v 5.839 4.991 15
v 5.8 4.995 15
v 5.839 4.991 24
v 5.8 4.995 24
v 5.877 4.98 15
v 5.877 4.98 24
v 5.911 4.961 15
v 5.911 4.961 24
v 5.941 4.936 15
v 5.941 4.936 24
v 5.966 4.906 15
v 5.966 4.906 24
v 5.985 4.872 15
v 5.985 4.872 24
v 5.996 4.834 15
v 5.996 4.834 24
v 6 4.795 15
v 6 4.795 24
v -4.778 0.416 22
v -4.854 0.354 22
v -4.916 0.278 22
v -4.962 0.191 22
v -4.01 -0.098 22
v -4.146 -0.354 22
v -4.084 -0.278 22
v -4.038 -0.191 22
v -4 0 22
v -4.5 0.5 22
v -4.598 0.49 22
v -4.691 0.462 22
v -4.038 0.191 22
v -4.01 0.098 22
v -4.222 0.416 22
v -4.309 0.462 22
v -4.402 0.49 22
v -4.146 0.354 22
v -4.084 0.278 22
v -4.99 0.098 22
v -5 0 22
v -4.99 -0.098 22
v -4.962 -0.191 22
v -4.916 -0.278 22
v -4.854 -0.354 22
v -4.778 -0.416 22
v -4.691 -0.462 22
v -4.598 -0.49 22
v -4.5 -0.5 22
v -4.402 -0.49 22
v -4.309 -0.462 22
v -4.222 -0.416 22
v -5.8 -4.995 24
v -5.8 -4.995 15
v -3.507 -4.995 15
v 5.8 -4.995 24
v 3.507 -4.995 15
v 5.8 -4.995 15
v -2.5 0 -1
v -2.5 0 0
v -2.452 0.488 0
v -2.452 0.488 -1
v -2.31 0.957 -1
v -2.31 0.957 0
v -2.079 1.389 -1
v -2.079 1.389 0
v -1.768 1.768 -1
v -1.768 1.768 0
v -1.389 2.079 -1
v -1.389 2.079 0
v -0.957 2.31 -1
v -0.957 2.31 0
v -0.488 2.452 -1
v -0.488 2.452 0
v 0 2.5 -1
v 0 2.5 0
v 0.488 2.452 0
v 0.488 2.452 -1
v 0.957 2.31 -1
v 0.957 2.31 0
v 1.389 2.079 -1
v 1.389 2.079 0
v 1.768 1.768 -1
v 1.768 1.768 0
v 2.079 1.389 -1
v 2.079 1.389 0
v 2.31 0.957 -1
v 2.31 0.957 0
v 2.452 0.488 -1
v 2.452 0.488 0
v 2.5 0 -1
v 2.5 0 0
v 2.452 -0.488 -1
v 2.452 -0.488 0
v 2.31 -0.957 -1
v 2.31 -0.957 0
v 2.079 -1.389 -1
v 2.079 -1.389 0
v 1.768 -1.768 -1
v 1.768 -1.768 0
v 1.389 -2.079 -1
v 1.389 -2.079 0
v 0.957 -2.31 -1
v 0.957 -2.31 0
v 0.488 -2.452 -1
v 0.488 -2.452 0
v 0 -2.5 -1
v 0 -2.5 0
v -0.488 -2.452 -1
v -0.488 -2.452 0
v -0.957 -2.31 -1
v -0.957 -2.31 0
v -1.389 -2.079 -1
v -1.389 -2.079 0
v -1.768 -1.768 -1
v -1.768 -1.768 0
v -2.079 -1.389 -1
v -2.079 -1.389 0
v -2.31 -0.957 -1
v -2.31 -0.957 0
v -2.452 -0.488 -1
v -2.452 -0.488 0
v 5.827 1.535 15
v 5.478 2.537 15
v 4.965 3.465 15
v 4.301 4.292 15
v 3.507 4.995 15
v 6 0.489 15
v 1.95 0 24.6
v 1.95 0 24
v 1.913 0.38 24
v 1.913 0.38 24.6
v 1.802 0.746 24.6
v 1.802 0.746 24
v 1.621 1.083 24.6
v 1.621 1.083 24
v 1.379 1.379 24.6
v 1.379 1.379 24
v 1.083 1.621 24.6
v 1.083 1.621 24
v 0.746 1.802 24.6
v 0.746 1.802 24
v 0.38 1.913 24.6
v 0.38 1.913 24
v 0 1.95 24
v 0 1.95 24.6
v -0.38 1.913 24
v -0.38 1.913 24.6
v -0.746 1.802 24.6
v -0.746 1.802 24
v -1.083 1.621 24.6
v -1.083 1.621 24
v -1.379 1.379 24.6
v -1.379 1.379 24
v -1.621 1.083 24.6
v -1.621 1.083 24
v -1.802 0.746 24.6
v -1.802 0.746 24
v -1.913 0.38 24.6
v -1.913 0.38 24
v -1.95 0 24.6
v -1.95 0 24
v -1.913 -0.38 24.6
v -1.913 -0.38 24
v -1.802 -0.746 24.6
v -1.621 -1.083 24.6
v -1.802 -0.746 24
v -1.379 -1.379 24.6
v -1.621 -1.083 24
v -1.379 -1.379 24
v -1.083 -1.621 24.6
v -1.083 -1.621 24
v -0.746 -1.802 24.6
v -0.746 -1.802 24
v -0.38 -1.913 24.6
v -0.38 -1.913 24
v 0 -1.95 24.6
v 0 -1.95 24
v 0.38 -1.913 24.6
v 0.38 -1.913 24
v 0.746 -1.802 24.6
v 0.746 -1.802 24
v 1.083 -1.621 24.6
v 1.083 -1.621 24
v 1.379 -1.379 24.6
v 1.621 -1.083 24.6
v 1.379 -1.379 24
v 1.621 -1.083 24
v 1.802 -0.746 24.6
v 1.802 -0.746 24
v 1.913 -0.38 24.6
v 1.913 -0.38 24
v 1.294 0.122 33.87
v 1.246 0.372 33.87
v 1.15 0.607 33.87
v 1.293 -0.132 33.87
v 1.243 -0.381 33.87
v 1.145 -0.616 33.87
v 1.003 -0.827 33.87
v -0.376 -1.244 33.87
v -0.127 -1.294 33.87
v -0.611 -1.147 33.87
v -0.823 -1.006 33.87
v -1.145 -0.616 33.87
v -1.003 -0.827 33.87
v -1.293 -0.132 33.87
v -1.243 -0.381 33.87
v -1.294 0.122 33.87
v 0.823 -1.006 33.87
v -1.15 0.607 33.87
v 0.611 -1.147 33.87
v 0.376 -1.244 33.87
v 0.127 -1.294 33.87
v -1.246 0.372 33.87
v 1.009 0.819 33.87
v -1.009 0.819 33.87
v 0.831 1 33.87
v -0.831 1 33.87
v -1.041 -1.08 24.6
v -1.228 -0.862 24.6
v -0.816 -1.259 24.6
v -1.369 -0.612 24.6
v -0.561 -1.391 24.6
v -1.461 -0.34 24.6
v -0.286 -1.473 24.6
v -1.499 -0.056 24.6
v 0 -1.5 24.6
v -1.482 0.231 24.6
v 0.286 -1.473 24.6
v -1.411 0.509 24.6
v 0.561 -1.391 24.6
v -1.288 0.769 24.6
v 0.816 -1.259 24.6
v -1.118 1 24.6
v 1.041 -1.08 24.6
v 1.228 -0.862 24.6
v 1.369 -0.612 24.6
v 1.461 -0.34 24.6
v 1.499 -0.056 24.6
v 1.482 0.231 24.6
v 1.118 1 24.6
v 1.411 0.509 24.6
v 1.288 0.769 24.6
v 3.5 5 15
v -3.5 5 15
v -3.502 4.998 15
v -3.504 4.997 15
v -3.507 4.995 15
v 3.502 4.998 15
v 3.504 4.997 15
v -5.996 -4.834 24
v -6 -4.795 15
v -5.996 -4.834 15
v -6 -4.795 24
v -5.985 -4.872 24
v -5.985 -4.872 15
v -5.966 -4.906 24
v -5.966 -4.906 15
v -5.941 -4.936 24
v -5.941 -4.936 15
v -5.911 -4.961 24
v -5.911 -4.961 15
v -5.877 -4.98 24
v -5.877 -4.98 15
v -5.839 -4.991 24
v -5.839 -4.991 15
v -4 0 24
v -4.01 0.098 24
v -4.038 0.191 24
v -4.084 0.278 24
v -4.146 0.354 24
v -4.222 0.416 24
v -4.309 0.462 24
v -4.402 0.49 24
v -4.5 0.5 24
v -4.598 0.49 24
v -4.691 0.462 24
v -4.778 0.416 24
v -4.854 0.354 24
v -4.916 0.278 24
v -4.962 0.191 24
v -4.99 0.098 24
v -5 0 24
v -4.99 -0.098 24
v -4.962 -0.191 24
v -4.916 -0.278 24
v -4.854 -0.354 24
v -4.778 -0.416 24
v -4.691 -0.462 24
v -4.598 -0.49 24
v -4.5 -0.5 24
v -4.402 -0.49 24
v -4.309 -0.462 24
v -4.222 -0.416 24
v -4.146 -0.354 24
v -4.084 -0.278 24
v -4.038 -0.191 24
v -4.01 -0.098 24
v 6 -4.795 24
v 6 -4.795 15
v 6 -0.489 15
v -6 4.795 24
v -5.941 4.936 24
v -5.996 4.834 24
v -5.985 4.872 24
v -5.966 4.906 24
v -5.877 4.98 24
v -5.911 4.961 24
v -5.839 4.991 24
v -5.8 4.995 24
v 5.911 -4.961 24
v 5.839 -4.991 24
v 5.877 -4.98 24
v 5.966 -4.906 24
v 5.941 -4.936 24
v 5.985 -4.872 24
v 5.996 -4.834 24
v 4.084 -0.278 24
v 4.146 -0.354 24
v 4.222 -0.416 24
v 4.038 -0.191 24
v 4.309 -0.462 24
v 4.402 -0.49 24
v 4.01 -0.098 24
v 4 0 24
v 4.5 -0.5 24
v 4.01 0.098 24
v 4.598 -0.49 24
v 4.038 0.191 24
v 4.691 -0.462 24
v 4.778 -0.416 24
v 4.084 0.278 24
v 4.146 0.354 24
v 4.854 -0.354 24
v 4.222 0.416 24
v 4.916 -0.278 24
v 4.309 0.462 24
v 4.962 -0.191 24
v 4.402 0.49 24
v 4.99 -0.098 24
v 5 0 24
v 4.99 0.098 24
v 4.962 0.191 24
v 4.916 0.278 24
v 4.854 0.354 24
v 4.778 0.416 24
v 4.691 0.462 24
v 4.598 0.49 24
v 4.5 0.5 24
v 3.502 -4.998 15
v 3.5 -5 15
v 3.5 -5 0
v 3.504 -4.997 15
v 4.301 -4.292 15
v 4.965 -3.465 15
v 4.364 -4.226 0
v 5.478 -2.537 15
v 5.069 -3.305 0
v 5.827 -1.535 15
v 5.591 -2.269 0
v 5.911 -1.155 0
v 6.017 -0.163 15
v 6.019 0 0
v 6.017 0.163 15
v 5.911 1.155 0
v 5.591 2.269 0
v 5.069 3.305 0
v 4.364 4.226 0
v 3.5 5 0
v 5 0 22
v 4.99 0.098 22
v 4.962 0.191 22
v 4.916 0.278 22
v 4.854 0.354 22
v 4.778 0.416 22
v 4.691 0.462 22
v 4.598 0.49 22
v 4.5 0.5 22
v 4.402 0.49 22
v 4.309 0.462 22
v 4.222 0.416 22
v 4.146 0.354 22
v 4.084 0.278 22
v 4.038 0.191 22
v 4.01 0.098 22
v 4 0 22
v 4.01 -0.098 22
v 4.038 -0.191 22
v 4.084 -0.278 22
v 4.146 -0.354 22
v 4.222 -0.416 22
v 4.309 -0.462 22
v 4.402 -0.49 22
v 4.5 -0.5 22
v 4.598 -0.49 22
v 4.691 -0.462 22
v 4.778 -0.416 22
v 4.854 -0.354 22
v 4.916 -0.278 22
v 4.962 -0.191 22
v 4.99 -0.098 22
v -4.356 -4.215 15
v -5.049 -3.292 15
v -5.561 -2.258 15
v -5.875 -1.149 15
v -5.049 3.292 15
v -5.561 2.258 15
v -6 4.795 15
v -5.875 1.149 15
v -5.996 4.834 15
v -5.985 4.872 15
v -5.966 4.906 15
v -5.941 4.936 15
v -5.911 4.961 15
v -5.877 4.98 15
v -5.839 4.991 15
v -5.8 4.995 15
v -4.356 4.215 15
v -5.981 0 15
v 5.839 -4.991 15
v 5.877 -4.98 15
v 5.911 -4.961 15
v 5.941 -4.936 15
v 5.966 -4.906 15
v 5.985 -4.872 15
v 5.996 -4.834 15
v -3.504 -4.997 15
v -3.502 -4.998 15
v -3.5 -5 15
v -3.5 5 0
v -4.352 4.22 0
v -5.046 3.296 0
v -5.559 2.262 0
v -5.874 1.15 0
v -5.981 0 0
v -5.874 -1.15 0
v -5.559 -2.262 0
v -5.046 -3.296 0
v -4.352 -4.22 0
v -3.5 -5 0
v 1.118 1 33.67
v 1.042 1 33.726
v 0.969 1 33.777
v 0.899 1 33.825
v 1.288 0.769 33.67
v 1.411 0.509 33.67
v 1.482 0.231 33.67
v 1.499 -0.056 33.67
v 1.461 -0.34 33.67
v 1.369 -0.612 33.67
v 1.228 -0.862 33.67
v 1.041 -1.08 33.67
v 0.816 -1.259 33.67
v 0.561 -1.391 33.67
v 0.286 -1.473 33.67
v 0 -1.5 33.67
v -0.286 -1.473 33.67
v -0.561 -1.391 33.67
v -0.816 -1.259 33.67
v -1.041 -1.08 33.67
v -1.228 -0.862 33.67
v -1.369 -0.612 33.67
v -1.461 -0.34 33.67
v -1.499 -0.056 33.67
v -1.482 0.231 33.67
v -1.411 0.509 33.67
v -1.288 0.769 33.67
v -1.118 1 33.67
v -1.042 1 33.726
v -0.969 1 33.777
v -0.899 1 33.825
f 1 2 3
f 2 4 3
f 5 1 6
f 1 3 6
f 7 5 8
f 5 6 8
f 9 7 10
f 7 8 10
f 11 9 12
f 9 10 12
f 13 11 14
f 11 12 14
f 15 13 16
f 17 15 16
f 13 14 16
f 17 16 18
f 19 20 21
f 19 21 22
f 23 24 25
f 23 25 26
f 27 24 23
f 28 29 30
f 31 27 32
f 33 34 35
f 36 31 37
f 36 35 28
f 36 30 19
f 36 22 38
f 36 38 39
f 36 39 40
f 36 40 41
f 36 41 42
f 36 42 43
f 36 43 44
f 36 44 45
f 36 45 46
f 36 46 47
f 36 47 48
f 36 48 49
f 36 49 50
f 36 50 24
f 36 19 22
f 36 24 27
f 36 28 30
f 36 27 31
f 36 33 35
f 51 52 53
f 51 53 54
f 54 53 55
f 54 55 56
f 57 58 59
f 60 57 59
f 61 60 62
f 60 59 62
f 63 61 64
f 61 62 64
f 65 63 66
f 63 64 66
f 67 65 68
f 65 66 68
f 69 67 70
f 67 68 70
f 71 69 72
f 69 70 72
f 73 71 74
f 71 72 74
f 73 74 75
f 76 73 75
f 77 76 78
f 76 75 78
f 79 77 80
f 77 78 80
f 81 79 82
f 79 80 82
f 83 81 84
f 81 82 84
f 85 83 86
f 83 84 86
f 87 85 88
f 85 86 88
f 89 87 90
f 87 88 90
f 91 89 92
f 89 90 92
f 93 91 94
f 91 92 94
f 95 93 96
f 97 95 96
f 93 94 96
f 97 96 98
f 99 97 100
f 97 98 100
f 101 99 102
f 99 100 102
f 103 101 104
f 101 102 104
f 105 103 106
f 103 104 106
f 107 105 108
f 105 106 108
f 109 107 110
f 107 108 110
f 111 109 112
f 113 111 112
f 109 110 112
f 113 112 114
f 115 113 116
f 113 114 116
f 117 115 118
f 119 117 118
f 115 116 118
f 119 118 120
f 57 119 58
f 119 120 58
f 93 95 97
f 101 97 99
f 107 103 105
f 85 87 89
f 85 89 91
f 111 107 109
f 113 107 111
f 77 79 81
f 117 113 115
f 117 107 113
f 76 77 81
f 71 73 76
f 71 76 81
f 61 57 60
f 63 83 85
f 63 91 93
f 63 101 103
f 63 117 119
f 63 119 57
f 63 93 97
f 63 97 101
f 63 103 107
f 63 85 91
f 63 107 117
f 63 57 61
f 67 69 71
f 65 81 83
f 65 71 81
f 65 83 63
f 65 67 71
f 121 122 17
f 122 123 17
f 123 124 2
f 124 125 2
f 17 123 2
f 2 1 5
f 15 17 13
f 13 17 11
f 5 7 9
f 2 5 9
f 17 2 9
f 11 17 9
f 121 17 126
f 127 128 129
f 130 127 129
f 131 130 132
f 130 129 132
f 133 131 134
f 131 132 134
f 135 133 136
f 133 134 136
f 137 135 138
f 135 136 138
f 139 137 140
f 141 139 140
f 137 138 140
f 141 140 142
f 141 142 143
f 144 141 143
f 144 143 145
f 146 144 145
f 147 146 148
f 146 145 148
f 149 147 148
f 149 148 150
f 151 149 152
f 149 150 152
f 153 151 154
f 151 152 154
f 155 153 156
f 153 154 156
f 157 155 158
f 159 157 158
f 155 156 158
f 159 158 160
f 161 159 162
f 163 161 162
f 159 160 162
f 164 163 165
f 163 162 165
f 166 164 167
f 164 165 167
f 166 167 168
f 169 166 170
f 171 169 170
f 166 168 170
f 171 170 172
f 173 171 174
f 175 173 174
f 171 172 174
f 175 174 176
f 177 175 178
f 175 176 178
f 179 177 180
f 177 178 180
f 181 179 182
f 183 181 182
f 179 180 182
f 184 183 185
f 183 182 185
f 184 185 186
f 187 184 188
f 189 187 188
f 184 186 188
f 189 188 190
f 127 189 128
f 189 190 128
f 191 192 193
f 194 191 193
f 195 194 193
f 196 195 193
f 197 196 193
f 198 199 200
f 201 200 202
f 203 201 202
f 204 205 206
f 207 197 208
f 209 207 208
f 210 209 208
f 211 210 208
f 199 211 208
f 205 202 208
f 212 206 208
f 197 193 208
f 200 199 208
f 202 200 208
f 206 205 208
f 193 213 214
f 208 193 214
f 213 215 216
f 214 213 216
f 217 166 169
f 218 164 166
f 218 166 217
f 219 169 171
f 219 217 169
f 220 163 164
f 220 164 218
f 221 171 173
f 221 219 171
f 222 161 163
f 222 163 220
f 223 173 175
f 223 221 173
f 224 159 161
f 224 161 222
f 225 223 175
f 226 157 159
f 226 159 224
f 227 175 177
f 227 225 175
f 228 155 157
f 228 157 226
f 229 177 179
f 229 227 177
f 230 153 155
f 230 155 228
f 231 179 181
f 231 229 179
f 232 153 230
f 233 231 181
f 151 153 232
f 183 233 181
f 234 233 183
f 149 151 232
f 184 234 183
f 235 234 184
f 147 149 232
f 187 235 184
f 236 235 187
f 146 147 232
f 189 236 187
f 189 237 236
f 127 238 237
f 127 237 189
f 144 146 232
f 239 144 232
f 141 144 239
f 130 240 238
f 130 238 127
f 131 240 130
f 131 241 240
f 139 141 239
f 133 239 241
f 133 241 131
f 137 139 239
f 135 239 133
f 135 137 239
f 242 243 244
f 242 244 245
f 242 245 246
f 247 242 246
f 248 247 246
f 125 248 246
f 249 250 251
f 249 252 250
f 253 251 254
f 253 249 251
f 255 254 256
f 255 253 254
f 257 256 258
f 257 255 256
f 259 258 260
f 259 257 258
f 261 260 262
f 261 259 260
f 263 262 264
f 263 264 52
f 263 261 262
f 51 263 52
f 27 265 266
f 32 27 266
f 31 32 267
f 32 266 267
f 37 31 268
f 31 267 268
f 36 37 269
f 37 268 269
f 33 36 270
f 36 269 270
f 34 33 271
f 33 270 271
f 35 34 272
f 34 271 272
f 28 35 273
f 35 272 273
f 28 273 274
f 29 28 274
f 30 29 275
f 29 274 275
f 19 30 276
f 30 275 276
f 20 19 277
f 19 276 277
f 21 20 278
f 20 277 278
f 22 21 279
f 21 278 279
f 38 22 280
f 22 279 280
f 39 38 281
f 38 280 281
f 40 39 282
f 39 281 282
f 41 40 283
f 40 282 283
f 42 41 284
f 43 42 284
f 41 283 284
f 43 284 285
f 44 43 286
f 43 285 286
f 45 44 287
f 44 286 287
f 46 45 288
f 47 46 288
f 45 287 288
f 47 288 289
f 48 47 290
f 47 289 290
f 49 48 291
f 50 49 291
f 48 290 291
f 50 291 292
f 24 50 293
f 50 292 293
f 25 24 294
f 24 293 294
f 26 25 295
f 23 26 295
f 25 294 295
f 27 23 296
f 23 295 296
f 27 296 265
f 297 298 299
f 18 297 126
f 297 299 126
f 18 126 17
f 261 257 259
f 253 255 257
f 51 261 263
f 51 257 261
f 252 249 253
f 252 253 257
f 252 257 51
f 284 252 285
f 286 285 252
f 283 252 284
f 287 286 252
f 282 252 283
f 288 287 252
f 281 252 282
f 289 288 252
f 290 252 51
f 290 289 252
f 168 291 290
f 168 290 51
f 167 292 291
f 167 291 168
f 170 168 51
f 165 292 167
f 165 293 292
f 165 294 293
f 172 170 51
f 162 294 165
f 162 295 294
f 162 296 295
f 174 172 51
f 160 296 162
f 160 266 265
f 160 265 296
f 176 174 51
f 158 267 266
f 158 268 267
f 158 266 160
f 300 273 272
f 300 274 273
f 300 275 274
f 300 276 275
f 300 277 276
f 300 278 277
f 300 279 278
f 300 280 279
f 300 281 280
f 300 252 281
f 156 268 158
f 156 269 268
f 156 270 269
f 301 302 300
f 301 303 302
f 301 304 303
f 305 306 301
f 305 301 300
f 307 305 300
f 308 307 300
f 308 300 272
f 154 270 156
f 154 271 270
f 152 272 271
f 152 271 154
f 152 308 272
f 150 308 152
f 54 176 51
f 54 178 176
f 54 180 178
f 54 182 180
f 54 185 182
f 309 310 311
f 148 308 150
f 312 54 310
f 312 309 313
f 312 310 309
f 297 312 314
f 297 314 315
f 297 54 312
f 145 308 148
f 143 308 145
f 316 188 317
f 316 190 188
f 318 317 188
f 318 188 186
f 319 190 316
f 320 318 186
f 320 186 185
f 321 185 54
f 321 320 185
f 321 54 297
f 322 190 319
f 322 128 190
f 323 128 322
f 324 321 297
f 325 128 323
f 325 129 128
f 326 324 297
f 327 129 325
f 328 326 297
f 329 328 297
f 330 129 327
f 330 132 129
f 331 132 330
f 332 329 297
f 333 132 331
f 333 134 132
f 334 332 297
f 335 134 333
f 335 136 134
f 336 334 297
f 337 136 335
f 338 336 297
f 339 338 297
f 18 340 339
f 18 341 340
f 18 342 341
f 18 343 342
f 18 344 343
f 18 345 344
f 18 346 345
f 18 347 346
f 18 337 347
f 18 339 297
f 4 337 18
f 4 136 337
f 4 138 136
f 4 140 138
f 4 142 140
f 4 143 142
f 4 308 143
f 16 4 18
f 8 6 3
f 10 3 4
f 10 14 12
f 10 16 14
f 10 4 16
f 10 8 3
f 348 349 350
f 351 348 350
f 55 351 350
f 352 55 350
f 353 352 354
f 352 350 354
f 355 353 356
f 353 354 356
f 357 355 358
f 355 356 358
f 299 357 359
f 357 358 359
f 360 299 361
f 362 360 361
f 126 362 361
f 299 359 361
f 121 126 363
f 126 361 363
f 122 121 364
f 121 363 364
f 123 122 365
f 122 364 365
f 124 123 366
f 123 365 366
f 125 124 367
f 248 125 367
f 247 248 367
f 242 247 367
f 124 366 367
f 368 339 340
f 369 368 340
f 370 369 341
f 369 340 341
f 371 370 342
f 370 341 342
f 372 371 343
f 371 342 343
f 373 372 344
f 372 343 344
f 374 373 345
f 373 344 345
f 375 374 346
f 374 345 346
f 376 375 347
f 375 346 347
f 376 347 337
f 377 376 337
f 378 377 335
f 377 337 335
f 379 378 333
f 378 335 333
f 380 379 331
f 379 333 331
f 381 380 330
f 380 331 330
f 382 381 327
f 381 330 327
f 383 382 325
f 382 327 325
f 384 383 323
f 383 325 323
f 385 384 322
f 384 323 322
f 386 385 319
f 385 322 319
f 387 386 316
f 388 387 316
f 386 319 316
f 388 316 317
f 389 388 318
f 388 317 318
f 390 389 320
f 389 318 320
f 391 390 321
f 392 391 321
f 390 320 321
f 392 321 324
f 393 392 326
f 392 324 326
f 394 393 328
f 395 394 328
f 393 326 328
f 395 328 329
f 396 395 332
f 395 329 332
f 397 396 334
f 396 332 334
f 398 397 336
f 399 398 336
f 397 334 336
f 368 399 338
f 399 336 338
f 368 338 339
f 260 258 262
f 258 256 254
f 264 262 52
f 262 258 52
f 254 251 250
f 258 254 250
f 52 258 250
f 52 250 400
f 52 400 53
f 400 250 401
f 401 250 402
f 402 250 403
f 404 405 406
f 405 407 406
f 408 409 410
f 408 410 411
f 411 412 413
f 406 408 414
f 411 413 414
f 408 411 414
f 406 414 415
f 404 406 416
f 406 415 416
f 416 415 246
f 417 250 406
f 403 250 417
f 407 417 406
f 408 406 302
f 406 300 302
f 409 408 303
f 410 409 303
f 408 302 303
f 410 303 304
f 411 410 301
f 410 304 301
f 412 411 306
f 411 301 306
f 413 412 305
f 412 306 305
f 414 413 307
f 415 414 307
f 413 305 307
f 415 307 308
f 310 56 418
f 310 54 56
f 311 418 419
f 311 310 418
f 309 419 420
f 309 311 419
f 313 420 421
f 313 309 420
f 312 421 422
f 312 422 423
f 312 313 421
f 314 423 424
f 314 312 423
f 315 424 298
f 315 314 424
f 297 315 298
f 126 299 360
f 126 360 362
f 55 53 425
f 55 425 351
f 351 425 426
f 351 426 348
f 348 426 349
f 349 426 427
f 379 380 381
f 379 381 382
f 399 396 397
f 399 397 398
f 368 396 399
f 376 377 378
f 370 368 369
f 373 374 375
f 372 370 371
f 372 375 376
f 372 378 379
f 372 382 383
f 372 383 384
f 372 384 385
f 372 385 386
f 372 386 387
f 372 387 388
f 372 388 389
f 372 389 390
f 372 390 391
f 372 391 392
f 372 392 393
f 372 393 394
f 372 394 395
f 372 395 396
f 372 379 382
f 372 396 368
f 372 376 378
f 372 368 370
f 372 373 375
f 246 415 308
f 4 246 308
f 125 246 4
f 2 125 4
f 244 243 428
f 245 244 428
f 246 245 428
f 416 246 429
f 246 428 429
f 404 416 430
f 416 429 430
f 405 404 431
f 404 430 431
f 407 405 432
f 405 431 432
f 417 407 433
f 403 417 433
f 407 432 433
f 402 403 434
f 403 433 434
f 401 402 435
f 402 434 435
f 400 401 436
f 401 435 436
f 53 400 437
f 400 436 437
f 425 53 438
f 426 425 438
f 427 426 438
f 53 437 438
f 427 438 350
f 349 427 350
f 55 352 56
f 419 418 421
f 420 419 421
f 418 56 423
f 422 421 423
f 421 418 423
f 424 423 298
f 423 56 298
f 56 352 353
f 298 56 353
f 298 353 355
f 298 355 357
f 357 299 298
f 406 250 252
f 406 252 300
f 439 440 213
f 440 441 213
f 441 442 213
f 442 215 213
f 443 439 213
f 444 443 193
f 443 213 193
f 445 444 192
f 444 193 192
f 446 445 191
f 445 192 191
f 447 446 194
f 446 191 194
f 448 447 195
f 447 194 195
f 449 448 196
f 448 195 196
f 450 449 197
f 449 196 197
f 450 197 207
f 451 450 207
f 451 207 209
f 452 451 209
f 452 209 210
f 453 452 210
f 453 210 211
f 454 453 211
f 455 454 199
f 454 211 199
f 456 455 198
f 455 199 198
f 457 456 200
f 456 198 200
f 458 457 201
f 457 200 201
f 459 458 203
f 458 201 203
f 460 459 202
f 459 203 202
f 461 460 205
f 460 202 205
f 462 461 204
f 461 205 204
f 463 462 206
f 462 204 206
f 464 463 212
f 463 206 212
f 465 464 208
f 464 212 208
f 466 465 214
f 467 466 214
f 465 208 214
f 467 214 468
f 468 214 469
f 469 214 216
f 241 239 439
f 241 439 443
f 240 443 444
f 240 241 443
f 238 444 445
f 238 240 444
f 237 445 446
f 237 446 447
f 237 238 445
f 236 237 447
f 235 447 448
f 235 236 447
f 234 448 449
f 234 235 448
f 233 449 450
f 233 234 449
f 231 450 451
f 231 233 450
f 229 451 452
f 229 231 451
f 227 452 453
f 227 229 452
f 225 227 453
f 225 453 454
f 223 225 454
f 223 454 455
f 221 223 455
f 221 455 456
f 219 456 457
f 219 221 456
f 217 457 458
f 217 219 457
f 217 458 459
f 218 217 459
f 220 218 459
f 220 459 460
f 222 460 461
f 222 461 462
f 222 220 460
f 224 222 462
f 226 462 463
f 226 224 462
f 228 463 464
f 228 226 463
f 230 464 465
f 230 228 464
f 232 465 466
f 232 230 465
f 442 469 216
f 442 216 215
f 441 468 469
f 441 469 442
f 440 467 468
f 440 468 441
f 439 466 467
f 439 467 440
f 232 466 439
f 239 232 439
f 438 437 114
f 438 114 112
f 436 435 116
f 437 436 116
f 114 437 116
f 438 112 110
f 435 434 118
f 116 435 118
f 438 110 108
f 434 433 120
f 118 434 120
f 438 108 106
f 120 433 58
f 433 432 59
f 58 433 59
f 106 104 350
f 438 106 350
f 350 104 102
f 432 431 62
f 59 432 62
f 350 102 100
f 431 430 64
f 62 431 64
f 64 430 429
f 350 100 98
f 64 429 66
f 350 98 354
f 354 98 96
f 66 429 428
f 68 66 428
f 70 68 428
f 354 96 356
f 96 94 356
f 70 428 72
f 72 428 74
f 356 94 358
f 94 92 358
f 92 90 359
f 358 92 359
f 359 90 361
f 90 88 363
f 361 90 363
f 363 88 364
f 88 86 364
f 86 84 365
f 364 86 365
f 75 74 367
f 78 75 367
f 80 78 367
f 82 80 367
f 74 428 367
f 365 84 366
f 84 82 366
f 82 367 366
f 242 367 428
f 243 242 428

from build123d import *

# Parameters (mm, degrees)
SALIENTE_EXTRUIR1_DEPTH = 15
CROQUIS2_R              = 2.5
SALIENTE_EXTRUIR2_DEPTH = 1
CROQUIS3_W              = 12
CROQUIS3_H              = 9.99
SALIENTE_EXTRUIR3_DEPTH = 9
REDONDEO1_R             = 0.2
CROQUIS4_R              = 1.95
SALIENTE_EXTRUIR4_DEPTH = 0.6
SALIENTE_EXTRUIR5_DEPTH = 9.27
CHAFL_N1_SIZE           = 0.2
CROQUIS6_R              = 0.5
CORTAR_EXTRUIR1_DEPTH   = 2


with BuildPart() as part:
    # Croquis1 → Saliente-Extruir1 (new body)
    with BuildSketch(Plane.XY):
        with BuildLine():
            Line((-3.5, -5), (3.5, -5))
            ThreePointArc((3.5, -5), (6.019255673, 0), (3.5, 5))
            Line((3.5, 5), (-3.5, 5))
            ThreePointArc((-3.5, 5), (-5.980744327, 0), (-3.5, -5))
        make_face()
    extrude(amount=SALIENTE_EXTRUIR1_DEPTH)

    # Croquis2 → Saliente-Extruir2 (add)
    with BuildSketch(Plane(origin=(0, 0, 0), x_dir=(-1, 0, 0), z_dir=(0, 0, -1))):
        Circle(CROQUIS2_R)
    extrude(amount=SALIENTE_EXTRUIR2_DEPTH)

    # Croquis3 → Saliente-Extruir3 (add)
    with BuildSketch(Plane.XY.offset(15)):
        Rectangle(CROQUIS3_W, CROQUIS3_H)
    extrude(amount=SALIENTE_EXTRUIR3_DEPTH)

    # Redondeo1
    redondeo1_edges = [part.edges().sort_by_distance(p)[0] for p in [
        (6, -4.995, 19.5),
        (6, 4.995, 19.5),
        (-6, 4.995, 19.5),
        (-6, -4.995, 19.5),
    ]]
    fillet(redondeo1_edges, radius=REDONDEO1_R)

    # Croquis4 → Saliente-Extruir4 (add)
    with BuildSketch(Plane.XY.offset(24)):
        Circle(CROQUIS4_R)
    extrude(amount=SALIENTE_EXTRUIR4_DEPTH)

    # Croquis5 → Saliente-Extruir5 (add)
    with BuildSketch(Plane.XY.offset(24.6)):
        with BuildLine():
            Line((-1.118033989, 1), (1.118033989, 1))
            ThreePointArc((1.118033989, 1), (0, -1.5), (-1.118033989, 1))
        make_face()
    extrude(amount=SALIENTE_EXTRUIR5_DEPTH)

    # Chaflán1
    chafl_n1_edges = [part.edges().sort_by_distance(p)[0] for p in [
        (0, -1.5, 33.87),
    ]]
    chamfer(chafl_n1_edges, length=CHAFL_N1_SIZE)

    # Croquis6 → Cortar-Extruir1 (cut)
    with BuildSketch(Plane.XY.offset(24)):
        with Locations((-4.5, 0)):
            Circle(CROQUIS6_R)
        with Locations((4.5, 0)):
            Circle(CROQUIS6_R)
    extrude(amount=-CORTAR_EXTRUIR1_DEPTH, mode=Mode.SUBTRACT)


solid = part.part
